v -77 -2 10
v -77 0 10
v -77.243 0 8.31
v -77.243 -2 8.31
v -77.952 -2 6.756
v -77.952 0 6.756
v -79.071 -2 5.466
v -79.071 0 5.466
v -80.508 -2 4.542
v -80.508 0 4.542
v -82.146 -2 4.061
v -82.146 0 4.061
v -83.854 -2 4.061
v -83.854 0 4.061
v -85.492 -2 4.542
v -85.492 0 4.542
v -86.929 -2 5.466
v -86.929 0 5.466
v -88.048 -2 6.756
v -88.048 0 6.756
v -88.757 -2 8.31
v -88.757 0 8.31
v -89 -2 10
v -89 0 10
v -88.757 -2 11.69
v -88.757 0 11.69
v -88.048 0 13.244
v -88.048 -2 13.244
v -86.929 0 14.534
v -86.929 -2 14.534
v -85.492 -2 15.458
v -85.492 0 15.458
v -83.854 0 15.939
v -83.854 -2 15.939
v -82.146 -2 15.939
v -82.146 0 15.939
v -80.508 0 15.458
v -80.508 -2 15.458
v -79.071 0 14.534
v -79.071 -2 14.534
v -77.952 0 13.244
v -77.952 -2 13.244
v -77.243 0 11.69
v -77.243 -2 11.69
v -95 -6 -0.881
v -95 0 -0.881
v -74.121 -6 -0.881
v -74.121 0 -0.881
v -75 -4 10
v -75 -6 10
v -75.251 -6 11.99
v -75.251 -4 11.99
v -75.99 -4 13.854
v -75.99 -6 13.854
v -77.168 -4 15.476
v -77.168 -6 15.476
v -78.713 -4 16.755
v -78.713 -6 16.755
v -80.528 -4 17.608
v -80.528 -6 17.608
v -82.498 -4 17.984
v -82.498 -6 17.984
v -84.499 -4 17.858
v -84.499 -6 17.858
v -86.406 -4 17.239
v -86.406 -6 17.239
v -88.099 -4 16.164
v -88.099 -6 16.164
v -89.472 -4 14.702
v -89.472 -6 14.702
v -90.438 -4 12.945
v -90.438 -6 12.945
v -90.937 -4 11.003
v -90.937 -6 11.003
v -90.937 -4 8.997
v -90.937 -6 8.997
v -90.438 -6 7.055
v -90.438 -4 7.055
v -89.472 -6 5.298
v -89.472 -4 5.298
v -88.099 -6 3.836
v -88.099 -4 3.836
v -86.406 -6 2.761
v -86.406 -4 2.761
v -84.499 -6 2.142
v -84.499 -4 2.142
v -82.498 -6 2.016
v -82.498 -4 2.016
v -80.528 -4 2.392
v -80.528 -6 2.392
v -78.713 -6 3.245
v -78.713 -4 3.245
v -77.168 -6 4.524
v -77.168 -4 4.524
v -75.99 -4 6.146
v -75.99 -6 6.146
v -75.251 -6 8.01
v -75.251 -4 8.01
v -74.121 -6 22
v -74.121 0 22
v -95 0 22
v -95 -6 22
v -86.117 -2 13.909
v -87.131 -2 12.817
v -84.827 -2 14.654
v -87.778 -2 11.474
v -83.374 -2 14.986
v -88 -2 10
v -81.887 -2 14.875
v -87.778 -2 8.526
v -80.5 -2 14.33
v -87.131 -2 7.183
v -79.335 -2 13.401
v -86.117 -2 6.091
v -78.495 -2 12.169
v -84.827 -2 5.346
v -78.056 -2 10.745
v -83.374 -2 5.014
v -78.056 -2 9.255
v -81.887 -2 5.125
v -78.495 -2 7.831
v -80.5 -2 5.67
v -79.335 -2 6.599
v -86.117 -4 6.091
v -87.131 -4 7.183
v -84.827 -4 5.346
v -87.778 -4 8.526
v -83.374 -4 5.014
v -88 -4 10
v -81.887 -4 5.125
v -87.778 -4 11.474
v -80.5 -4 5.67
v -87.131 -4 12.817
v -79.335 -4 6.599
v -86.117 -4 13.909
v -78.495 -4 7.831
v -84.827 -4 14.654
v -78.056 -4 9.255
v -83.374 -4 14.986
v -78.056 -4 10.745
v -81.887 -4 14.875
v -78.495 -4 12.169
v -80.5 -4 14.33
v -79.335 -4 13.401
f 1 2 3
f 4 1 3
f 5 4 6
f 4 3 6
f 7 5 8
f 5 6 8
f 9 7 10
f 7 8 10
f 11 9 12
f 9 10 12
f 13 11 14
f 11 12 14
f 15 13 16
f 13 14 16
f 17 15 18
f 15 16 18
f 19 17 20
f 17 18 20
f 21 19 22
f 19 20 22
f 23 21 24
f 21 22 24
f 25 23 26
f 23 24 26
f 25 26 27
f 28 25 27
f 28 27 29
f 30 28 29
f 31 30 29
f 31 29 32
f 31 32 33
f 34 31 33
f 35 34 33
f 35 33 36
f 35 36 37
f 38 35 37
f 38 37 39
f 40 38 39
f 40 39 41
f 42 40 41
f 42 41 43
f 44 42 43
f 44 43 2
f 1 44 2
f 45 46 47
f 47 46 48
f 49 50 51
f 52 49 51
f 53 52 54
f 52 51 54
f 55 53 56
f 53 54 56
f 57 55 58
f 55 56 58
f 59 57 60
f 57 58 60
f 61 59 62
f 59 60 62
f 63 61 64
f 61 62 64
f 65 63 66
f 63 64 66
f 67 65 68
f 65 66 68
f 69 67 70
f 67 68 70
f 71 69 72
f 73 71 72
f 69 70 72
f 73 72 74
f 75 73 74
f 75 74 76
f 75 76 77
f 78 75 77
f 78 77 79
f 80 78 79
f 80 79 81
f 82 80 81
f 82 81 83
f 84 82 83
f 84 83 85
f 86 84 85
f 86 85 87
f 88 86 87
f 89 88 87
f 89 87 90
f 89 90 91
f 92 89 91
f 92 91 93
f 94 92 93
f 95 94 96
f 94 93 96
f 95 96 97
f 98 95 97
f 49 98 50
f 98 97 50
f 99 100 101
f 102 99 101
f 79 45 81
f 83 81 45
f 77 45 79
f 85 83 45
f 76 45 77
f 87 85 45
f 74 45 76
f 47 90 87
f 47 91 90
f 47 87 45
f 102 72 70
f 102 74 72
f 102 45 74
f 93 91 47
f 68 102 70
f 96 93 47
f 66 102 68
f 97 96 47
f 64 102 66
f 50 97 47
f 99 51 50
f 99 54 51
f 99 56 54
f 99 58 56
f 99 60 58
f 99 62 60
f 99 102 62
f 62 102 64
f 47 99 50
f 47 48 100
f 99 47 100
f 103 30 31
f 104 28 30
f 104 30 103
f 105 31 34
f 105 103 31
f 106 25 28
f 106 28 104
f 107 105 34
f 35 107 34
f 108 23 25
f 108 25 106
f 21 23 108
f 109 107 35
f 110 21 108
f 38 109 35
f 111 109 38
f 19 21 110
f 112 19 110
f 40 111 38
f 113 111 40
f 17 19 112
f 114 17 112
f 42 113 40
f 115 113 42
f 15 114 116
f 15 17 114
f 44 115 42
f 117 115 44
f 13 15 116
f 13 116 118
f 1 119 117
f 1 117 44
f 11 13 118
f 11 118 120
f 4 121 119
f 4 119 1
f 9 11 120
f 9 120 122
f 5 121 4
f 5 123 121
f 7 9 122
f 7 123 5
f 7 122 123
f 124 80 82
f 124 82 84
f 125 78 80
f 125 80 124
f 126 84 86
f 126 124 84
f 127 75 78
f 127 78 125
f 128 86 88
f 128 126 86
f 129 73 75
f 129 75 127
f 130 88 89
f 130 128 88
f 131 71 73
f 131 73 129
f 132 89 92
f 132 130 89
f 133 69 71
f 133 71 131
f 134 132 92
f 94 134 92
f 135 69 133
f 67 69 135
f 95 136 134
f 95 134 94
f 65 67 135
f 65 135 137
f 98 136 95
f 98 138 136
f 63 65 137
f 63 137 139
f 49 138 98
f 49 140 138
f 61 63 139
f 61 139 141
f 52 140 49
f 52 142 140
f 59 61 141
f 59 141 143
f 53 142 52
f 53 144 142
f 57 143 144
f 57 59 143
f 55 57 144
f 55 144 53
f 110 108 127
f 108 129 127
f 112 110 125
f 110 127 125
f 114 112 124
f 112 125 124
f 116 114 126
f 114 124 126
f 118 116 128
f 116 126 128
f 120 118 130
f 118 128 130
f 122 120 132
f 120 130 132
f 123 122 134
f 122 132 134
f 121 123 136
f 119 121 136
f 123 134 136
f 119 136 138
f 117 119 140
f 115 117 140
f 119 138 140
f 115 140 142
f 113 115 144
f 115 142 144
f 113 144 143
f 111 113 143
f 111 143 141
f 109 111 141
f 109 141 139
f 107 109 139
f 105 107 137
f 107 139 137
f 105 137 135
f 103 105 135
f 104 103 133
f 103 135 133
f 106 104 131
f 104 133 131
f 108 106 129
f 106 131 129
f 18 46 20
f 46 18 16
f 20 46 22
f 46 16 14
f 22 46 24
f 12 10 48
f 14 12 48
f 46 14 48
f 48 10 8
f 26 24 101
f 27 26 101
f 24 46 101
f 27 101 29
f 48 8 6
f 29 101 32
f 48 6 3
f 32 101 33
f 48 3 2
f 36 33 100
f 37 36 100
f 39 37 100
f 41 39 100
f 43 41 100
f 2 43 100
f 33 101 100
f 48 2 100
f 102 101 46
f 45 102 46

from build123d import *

# Parameters (mm, degrees)
F2_R           = 4.5
F2_W           = 20.8794145286
F2_H           = 3.3811966982
F3_DEPTH       = 6
F4_D           = 10
F4_DEPTH       = 4
F4_CBORE_D     = 12
F4_CBORE_DEPTH = 2
F4_TIP         = 3.0043030951
F6_D           = 9
F6_DEPTH       = 6
F6_CBORE_D     = 16
F6_CBORE_DEPTH = 2
F6_TIP         = 2.7038727856


with BuildPart() as f3:
    # F2 (on face) → F3 (new body)
    with BuildSketch(Plane.XZ):
        with BuildLine():
            Line((-74.1205854714, 17), (-93, 17))
            ThreePointArc((-93, 17), (-94.4142135624, 16.4142135624), (-95, 15))
            Line((-95, 15), (-95, 2.5))
            Line((-95, 2.5), (-74.1205854714, 2.5))
            Line((-74.1205854714, 2.5), (-74.1205854714, 17))
        make_face()
        with Locations((-83, 10)):
            Circle(F2_R, mode=Mode.SUBTRACT)
        Polygon((-95, 17), (-93, 17), (-74.1205854714, 17), (-74.1205854714, 22), (-95, 22), align=None)
        with Locations((-84.5602927357, 0.8094016509)):
            Rectangle(F2_W, F2_H)
        with Locations((-83, 10)):
            Circle(F2_R)
        with BuildLine():
            ThreePointArc((-95, 15), (-94.4142135624, 16.4142135624), (-93, 17))
            Line((-93, 17), (-95, 17))
            Line((-95, 17), (-95, 15))
        make_face()
    extrude(amount=F3_DEPTH)

    # F4
    with Locations(Plane(origin=(0, 0, 0), x_dir=(1, 0, 0), z_dir=(0, 1, 0))):
        with Locations((-63, -10), (-83, -10), (-83, 10), (-63, 10)):
            CounterBoreHole(F4_D / 2, F4_CBORE_D / 2, F4_CBORE_DEPTH, depth=F4_DEPTH)
            with Locations((0, 0, -(F4_DEPTH + F4_TIP / 2))):  # 118° drill point
                Cone(0, F4_D / 2, F4_TIP, mode=Mode.SUBTRACT)

    # F6
    with Locations(Plane.XZ.offset(6)):
        with Locations((-83, 10)):
            CounterBoreHole(F6_D / 2, F6_CBORE_D / 2, F6_CBORE_DEPTH, depth=F6_DEPTH)
            with Locations((0, 0, -(F6_DEPTH + F6_TIP / 2))):  # 118° drill point
                Cone(0, F6_D / 2, F6_TIP, mode=Mode.SUBTRACT)


solid = f3.part
